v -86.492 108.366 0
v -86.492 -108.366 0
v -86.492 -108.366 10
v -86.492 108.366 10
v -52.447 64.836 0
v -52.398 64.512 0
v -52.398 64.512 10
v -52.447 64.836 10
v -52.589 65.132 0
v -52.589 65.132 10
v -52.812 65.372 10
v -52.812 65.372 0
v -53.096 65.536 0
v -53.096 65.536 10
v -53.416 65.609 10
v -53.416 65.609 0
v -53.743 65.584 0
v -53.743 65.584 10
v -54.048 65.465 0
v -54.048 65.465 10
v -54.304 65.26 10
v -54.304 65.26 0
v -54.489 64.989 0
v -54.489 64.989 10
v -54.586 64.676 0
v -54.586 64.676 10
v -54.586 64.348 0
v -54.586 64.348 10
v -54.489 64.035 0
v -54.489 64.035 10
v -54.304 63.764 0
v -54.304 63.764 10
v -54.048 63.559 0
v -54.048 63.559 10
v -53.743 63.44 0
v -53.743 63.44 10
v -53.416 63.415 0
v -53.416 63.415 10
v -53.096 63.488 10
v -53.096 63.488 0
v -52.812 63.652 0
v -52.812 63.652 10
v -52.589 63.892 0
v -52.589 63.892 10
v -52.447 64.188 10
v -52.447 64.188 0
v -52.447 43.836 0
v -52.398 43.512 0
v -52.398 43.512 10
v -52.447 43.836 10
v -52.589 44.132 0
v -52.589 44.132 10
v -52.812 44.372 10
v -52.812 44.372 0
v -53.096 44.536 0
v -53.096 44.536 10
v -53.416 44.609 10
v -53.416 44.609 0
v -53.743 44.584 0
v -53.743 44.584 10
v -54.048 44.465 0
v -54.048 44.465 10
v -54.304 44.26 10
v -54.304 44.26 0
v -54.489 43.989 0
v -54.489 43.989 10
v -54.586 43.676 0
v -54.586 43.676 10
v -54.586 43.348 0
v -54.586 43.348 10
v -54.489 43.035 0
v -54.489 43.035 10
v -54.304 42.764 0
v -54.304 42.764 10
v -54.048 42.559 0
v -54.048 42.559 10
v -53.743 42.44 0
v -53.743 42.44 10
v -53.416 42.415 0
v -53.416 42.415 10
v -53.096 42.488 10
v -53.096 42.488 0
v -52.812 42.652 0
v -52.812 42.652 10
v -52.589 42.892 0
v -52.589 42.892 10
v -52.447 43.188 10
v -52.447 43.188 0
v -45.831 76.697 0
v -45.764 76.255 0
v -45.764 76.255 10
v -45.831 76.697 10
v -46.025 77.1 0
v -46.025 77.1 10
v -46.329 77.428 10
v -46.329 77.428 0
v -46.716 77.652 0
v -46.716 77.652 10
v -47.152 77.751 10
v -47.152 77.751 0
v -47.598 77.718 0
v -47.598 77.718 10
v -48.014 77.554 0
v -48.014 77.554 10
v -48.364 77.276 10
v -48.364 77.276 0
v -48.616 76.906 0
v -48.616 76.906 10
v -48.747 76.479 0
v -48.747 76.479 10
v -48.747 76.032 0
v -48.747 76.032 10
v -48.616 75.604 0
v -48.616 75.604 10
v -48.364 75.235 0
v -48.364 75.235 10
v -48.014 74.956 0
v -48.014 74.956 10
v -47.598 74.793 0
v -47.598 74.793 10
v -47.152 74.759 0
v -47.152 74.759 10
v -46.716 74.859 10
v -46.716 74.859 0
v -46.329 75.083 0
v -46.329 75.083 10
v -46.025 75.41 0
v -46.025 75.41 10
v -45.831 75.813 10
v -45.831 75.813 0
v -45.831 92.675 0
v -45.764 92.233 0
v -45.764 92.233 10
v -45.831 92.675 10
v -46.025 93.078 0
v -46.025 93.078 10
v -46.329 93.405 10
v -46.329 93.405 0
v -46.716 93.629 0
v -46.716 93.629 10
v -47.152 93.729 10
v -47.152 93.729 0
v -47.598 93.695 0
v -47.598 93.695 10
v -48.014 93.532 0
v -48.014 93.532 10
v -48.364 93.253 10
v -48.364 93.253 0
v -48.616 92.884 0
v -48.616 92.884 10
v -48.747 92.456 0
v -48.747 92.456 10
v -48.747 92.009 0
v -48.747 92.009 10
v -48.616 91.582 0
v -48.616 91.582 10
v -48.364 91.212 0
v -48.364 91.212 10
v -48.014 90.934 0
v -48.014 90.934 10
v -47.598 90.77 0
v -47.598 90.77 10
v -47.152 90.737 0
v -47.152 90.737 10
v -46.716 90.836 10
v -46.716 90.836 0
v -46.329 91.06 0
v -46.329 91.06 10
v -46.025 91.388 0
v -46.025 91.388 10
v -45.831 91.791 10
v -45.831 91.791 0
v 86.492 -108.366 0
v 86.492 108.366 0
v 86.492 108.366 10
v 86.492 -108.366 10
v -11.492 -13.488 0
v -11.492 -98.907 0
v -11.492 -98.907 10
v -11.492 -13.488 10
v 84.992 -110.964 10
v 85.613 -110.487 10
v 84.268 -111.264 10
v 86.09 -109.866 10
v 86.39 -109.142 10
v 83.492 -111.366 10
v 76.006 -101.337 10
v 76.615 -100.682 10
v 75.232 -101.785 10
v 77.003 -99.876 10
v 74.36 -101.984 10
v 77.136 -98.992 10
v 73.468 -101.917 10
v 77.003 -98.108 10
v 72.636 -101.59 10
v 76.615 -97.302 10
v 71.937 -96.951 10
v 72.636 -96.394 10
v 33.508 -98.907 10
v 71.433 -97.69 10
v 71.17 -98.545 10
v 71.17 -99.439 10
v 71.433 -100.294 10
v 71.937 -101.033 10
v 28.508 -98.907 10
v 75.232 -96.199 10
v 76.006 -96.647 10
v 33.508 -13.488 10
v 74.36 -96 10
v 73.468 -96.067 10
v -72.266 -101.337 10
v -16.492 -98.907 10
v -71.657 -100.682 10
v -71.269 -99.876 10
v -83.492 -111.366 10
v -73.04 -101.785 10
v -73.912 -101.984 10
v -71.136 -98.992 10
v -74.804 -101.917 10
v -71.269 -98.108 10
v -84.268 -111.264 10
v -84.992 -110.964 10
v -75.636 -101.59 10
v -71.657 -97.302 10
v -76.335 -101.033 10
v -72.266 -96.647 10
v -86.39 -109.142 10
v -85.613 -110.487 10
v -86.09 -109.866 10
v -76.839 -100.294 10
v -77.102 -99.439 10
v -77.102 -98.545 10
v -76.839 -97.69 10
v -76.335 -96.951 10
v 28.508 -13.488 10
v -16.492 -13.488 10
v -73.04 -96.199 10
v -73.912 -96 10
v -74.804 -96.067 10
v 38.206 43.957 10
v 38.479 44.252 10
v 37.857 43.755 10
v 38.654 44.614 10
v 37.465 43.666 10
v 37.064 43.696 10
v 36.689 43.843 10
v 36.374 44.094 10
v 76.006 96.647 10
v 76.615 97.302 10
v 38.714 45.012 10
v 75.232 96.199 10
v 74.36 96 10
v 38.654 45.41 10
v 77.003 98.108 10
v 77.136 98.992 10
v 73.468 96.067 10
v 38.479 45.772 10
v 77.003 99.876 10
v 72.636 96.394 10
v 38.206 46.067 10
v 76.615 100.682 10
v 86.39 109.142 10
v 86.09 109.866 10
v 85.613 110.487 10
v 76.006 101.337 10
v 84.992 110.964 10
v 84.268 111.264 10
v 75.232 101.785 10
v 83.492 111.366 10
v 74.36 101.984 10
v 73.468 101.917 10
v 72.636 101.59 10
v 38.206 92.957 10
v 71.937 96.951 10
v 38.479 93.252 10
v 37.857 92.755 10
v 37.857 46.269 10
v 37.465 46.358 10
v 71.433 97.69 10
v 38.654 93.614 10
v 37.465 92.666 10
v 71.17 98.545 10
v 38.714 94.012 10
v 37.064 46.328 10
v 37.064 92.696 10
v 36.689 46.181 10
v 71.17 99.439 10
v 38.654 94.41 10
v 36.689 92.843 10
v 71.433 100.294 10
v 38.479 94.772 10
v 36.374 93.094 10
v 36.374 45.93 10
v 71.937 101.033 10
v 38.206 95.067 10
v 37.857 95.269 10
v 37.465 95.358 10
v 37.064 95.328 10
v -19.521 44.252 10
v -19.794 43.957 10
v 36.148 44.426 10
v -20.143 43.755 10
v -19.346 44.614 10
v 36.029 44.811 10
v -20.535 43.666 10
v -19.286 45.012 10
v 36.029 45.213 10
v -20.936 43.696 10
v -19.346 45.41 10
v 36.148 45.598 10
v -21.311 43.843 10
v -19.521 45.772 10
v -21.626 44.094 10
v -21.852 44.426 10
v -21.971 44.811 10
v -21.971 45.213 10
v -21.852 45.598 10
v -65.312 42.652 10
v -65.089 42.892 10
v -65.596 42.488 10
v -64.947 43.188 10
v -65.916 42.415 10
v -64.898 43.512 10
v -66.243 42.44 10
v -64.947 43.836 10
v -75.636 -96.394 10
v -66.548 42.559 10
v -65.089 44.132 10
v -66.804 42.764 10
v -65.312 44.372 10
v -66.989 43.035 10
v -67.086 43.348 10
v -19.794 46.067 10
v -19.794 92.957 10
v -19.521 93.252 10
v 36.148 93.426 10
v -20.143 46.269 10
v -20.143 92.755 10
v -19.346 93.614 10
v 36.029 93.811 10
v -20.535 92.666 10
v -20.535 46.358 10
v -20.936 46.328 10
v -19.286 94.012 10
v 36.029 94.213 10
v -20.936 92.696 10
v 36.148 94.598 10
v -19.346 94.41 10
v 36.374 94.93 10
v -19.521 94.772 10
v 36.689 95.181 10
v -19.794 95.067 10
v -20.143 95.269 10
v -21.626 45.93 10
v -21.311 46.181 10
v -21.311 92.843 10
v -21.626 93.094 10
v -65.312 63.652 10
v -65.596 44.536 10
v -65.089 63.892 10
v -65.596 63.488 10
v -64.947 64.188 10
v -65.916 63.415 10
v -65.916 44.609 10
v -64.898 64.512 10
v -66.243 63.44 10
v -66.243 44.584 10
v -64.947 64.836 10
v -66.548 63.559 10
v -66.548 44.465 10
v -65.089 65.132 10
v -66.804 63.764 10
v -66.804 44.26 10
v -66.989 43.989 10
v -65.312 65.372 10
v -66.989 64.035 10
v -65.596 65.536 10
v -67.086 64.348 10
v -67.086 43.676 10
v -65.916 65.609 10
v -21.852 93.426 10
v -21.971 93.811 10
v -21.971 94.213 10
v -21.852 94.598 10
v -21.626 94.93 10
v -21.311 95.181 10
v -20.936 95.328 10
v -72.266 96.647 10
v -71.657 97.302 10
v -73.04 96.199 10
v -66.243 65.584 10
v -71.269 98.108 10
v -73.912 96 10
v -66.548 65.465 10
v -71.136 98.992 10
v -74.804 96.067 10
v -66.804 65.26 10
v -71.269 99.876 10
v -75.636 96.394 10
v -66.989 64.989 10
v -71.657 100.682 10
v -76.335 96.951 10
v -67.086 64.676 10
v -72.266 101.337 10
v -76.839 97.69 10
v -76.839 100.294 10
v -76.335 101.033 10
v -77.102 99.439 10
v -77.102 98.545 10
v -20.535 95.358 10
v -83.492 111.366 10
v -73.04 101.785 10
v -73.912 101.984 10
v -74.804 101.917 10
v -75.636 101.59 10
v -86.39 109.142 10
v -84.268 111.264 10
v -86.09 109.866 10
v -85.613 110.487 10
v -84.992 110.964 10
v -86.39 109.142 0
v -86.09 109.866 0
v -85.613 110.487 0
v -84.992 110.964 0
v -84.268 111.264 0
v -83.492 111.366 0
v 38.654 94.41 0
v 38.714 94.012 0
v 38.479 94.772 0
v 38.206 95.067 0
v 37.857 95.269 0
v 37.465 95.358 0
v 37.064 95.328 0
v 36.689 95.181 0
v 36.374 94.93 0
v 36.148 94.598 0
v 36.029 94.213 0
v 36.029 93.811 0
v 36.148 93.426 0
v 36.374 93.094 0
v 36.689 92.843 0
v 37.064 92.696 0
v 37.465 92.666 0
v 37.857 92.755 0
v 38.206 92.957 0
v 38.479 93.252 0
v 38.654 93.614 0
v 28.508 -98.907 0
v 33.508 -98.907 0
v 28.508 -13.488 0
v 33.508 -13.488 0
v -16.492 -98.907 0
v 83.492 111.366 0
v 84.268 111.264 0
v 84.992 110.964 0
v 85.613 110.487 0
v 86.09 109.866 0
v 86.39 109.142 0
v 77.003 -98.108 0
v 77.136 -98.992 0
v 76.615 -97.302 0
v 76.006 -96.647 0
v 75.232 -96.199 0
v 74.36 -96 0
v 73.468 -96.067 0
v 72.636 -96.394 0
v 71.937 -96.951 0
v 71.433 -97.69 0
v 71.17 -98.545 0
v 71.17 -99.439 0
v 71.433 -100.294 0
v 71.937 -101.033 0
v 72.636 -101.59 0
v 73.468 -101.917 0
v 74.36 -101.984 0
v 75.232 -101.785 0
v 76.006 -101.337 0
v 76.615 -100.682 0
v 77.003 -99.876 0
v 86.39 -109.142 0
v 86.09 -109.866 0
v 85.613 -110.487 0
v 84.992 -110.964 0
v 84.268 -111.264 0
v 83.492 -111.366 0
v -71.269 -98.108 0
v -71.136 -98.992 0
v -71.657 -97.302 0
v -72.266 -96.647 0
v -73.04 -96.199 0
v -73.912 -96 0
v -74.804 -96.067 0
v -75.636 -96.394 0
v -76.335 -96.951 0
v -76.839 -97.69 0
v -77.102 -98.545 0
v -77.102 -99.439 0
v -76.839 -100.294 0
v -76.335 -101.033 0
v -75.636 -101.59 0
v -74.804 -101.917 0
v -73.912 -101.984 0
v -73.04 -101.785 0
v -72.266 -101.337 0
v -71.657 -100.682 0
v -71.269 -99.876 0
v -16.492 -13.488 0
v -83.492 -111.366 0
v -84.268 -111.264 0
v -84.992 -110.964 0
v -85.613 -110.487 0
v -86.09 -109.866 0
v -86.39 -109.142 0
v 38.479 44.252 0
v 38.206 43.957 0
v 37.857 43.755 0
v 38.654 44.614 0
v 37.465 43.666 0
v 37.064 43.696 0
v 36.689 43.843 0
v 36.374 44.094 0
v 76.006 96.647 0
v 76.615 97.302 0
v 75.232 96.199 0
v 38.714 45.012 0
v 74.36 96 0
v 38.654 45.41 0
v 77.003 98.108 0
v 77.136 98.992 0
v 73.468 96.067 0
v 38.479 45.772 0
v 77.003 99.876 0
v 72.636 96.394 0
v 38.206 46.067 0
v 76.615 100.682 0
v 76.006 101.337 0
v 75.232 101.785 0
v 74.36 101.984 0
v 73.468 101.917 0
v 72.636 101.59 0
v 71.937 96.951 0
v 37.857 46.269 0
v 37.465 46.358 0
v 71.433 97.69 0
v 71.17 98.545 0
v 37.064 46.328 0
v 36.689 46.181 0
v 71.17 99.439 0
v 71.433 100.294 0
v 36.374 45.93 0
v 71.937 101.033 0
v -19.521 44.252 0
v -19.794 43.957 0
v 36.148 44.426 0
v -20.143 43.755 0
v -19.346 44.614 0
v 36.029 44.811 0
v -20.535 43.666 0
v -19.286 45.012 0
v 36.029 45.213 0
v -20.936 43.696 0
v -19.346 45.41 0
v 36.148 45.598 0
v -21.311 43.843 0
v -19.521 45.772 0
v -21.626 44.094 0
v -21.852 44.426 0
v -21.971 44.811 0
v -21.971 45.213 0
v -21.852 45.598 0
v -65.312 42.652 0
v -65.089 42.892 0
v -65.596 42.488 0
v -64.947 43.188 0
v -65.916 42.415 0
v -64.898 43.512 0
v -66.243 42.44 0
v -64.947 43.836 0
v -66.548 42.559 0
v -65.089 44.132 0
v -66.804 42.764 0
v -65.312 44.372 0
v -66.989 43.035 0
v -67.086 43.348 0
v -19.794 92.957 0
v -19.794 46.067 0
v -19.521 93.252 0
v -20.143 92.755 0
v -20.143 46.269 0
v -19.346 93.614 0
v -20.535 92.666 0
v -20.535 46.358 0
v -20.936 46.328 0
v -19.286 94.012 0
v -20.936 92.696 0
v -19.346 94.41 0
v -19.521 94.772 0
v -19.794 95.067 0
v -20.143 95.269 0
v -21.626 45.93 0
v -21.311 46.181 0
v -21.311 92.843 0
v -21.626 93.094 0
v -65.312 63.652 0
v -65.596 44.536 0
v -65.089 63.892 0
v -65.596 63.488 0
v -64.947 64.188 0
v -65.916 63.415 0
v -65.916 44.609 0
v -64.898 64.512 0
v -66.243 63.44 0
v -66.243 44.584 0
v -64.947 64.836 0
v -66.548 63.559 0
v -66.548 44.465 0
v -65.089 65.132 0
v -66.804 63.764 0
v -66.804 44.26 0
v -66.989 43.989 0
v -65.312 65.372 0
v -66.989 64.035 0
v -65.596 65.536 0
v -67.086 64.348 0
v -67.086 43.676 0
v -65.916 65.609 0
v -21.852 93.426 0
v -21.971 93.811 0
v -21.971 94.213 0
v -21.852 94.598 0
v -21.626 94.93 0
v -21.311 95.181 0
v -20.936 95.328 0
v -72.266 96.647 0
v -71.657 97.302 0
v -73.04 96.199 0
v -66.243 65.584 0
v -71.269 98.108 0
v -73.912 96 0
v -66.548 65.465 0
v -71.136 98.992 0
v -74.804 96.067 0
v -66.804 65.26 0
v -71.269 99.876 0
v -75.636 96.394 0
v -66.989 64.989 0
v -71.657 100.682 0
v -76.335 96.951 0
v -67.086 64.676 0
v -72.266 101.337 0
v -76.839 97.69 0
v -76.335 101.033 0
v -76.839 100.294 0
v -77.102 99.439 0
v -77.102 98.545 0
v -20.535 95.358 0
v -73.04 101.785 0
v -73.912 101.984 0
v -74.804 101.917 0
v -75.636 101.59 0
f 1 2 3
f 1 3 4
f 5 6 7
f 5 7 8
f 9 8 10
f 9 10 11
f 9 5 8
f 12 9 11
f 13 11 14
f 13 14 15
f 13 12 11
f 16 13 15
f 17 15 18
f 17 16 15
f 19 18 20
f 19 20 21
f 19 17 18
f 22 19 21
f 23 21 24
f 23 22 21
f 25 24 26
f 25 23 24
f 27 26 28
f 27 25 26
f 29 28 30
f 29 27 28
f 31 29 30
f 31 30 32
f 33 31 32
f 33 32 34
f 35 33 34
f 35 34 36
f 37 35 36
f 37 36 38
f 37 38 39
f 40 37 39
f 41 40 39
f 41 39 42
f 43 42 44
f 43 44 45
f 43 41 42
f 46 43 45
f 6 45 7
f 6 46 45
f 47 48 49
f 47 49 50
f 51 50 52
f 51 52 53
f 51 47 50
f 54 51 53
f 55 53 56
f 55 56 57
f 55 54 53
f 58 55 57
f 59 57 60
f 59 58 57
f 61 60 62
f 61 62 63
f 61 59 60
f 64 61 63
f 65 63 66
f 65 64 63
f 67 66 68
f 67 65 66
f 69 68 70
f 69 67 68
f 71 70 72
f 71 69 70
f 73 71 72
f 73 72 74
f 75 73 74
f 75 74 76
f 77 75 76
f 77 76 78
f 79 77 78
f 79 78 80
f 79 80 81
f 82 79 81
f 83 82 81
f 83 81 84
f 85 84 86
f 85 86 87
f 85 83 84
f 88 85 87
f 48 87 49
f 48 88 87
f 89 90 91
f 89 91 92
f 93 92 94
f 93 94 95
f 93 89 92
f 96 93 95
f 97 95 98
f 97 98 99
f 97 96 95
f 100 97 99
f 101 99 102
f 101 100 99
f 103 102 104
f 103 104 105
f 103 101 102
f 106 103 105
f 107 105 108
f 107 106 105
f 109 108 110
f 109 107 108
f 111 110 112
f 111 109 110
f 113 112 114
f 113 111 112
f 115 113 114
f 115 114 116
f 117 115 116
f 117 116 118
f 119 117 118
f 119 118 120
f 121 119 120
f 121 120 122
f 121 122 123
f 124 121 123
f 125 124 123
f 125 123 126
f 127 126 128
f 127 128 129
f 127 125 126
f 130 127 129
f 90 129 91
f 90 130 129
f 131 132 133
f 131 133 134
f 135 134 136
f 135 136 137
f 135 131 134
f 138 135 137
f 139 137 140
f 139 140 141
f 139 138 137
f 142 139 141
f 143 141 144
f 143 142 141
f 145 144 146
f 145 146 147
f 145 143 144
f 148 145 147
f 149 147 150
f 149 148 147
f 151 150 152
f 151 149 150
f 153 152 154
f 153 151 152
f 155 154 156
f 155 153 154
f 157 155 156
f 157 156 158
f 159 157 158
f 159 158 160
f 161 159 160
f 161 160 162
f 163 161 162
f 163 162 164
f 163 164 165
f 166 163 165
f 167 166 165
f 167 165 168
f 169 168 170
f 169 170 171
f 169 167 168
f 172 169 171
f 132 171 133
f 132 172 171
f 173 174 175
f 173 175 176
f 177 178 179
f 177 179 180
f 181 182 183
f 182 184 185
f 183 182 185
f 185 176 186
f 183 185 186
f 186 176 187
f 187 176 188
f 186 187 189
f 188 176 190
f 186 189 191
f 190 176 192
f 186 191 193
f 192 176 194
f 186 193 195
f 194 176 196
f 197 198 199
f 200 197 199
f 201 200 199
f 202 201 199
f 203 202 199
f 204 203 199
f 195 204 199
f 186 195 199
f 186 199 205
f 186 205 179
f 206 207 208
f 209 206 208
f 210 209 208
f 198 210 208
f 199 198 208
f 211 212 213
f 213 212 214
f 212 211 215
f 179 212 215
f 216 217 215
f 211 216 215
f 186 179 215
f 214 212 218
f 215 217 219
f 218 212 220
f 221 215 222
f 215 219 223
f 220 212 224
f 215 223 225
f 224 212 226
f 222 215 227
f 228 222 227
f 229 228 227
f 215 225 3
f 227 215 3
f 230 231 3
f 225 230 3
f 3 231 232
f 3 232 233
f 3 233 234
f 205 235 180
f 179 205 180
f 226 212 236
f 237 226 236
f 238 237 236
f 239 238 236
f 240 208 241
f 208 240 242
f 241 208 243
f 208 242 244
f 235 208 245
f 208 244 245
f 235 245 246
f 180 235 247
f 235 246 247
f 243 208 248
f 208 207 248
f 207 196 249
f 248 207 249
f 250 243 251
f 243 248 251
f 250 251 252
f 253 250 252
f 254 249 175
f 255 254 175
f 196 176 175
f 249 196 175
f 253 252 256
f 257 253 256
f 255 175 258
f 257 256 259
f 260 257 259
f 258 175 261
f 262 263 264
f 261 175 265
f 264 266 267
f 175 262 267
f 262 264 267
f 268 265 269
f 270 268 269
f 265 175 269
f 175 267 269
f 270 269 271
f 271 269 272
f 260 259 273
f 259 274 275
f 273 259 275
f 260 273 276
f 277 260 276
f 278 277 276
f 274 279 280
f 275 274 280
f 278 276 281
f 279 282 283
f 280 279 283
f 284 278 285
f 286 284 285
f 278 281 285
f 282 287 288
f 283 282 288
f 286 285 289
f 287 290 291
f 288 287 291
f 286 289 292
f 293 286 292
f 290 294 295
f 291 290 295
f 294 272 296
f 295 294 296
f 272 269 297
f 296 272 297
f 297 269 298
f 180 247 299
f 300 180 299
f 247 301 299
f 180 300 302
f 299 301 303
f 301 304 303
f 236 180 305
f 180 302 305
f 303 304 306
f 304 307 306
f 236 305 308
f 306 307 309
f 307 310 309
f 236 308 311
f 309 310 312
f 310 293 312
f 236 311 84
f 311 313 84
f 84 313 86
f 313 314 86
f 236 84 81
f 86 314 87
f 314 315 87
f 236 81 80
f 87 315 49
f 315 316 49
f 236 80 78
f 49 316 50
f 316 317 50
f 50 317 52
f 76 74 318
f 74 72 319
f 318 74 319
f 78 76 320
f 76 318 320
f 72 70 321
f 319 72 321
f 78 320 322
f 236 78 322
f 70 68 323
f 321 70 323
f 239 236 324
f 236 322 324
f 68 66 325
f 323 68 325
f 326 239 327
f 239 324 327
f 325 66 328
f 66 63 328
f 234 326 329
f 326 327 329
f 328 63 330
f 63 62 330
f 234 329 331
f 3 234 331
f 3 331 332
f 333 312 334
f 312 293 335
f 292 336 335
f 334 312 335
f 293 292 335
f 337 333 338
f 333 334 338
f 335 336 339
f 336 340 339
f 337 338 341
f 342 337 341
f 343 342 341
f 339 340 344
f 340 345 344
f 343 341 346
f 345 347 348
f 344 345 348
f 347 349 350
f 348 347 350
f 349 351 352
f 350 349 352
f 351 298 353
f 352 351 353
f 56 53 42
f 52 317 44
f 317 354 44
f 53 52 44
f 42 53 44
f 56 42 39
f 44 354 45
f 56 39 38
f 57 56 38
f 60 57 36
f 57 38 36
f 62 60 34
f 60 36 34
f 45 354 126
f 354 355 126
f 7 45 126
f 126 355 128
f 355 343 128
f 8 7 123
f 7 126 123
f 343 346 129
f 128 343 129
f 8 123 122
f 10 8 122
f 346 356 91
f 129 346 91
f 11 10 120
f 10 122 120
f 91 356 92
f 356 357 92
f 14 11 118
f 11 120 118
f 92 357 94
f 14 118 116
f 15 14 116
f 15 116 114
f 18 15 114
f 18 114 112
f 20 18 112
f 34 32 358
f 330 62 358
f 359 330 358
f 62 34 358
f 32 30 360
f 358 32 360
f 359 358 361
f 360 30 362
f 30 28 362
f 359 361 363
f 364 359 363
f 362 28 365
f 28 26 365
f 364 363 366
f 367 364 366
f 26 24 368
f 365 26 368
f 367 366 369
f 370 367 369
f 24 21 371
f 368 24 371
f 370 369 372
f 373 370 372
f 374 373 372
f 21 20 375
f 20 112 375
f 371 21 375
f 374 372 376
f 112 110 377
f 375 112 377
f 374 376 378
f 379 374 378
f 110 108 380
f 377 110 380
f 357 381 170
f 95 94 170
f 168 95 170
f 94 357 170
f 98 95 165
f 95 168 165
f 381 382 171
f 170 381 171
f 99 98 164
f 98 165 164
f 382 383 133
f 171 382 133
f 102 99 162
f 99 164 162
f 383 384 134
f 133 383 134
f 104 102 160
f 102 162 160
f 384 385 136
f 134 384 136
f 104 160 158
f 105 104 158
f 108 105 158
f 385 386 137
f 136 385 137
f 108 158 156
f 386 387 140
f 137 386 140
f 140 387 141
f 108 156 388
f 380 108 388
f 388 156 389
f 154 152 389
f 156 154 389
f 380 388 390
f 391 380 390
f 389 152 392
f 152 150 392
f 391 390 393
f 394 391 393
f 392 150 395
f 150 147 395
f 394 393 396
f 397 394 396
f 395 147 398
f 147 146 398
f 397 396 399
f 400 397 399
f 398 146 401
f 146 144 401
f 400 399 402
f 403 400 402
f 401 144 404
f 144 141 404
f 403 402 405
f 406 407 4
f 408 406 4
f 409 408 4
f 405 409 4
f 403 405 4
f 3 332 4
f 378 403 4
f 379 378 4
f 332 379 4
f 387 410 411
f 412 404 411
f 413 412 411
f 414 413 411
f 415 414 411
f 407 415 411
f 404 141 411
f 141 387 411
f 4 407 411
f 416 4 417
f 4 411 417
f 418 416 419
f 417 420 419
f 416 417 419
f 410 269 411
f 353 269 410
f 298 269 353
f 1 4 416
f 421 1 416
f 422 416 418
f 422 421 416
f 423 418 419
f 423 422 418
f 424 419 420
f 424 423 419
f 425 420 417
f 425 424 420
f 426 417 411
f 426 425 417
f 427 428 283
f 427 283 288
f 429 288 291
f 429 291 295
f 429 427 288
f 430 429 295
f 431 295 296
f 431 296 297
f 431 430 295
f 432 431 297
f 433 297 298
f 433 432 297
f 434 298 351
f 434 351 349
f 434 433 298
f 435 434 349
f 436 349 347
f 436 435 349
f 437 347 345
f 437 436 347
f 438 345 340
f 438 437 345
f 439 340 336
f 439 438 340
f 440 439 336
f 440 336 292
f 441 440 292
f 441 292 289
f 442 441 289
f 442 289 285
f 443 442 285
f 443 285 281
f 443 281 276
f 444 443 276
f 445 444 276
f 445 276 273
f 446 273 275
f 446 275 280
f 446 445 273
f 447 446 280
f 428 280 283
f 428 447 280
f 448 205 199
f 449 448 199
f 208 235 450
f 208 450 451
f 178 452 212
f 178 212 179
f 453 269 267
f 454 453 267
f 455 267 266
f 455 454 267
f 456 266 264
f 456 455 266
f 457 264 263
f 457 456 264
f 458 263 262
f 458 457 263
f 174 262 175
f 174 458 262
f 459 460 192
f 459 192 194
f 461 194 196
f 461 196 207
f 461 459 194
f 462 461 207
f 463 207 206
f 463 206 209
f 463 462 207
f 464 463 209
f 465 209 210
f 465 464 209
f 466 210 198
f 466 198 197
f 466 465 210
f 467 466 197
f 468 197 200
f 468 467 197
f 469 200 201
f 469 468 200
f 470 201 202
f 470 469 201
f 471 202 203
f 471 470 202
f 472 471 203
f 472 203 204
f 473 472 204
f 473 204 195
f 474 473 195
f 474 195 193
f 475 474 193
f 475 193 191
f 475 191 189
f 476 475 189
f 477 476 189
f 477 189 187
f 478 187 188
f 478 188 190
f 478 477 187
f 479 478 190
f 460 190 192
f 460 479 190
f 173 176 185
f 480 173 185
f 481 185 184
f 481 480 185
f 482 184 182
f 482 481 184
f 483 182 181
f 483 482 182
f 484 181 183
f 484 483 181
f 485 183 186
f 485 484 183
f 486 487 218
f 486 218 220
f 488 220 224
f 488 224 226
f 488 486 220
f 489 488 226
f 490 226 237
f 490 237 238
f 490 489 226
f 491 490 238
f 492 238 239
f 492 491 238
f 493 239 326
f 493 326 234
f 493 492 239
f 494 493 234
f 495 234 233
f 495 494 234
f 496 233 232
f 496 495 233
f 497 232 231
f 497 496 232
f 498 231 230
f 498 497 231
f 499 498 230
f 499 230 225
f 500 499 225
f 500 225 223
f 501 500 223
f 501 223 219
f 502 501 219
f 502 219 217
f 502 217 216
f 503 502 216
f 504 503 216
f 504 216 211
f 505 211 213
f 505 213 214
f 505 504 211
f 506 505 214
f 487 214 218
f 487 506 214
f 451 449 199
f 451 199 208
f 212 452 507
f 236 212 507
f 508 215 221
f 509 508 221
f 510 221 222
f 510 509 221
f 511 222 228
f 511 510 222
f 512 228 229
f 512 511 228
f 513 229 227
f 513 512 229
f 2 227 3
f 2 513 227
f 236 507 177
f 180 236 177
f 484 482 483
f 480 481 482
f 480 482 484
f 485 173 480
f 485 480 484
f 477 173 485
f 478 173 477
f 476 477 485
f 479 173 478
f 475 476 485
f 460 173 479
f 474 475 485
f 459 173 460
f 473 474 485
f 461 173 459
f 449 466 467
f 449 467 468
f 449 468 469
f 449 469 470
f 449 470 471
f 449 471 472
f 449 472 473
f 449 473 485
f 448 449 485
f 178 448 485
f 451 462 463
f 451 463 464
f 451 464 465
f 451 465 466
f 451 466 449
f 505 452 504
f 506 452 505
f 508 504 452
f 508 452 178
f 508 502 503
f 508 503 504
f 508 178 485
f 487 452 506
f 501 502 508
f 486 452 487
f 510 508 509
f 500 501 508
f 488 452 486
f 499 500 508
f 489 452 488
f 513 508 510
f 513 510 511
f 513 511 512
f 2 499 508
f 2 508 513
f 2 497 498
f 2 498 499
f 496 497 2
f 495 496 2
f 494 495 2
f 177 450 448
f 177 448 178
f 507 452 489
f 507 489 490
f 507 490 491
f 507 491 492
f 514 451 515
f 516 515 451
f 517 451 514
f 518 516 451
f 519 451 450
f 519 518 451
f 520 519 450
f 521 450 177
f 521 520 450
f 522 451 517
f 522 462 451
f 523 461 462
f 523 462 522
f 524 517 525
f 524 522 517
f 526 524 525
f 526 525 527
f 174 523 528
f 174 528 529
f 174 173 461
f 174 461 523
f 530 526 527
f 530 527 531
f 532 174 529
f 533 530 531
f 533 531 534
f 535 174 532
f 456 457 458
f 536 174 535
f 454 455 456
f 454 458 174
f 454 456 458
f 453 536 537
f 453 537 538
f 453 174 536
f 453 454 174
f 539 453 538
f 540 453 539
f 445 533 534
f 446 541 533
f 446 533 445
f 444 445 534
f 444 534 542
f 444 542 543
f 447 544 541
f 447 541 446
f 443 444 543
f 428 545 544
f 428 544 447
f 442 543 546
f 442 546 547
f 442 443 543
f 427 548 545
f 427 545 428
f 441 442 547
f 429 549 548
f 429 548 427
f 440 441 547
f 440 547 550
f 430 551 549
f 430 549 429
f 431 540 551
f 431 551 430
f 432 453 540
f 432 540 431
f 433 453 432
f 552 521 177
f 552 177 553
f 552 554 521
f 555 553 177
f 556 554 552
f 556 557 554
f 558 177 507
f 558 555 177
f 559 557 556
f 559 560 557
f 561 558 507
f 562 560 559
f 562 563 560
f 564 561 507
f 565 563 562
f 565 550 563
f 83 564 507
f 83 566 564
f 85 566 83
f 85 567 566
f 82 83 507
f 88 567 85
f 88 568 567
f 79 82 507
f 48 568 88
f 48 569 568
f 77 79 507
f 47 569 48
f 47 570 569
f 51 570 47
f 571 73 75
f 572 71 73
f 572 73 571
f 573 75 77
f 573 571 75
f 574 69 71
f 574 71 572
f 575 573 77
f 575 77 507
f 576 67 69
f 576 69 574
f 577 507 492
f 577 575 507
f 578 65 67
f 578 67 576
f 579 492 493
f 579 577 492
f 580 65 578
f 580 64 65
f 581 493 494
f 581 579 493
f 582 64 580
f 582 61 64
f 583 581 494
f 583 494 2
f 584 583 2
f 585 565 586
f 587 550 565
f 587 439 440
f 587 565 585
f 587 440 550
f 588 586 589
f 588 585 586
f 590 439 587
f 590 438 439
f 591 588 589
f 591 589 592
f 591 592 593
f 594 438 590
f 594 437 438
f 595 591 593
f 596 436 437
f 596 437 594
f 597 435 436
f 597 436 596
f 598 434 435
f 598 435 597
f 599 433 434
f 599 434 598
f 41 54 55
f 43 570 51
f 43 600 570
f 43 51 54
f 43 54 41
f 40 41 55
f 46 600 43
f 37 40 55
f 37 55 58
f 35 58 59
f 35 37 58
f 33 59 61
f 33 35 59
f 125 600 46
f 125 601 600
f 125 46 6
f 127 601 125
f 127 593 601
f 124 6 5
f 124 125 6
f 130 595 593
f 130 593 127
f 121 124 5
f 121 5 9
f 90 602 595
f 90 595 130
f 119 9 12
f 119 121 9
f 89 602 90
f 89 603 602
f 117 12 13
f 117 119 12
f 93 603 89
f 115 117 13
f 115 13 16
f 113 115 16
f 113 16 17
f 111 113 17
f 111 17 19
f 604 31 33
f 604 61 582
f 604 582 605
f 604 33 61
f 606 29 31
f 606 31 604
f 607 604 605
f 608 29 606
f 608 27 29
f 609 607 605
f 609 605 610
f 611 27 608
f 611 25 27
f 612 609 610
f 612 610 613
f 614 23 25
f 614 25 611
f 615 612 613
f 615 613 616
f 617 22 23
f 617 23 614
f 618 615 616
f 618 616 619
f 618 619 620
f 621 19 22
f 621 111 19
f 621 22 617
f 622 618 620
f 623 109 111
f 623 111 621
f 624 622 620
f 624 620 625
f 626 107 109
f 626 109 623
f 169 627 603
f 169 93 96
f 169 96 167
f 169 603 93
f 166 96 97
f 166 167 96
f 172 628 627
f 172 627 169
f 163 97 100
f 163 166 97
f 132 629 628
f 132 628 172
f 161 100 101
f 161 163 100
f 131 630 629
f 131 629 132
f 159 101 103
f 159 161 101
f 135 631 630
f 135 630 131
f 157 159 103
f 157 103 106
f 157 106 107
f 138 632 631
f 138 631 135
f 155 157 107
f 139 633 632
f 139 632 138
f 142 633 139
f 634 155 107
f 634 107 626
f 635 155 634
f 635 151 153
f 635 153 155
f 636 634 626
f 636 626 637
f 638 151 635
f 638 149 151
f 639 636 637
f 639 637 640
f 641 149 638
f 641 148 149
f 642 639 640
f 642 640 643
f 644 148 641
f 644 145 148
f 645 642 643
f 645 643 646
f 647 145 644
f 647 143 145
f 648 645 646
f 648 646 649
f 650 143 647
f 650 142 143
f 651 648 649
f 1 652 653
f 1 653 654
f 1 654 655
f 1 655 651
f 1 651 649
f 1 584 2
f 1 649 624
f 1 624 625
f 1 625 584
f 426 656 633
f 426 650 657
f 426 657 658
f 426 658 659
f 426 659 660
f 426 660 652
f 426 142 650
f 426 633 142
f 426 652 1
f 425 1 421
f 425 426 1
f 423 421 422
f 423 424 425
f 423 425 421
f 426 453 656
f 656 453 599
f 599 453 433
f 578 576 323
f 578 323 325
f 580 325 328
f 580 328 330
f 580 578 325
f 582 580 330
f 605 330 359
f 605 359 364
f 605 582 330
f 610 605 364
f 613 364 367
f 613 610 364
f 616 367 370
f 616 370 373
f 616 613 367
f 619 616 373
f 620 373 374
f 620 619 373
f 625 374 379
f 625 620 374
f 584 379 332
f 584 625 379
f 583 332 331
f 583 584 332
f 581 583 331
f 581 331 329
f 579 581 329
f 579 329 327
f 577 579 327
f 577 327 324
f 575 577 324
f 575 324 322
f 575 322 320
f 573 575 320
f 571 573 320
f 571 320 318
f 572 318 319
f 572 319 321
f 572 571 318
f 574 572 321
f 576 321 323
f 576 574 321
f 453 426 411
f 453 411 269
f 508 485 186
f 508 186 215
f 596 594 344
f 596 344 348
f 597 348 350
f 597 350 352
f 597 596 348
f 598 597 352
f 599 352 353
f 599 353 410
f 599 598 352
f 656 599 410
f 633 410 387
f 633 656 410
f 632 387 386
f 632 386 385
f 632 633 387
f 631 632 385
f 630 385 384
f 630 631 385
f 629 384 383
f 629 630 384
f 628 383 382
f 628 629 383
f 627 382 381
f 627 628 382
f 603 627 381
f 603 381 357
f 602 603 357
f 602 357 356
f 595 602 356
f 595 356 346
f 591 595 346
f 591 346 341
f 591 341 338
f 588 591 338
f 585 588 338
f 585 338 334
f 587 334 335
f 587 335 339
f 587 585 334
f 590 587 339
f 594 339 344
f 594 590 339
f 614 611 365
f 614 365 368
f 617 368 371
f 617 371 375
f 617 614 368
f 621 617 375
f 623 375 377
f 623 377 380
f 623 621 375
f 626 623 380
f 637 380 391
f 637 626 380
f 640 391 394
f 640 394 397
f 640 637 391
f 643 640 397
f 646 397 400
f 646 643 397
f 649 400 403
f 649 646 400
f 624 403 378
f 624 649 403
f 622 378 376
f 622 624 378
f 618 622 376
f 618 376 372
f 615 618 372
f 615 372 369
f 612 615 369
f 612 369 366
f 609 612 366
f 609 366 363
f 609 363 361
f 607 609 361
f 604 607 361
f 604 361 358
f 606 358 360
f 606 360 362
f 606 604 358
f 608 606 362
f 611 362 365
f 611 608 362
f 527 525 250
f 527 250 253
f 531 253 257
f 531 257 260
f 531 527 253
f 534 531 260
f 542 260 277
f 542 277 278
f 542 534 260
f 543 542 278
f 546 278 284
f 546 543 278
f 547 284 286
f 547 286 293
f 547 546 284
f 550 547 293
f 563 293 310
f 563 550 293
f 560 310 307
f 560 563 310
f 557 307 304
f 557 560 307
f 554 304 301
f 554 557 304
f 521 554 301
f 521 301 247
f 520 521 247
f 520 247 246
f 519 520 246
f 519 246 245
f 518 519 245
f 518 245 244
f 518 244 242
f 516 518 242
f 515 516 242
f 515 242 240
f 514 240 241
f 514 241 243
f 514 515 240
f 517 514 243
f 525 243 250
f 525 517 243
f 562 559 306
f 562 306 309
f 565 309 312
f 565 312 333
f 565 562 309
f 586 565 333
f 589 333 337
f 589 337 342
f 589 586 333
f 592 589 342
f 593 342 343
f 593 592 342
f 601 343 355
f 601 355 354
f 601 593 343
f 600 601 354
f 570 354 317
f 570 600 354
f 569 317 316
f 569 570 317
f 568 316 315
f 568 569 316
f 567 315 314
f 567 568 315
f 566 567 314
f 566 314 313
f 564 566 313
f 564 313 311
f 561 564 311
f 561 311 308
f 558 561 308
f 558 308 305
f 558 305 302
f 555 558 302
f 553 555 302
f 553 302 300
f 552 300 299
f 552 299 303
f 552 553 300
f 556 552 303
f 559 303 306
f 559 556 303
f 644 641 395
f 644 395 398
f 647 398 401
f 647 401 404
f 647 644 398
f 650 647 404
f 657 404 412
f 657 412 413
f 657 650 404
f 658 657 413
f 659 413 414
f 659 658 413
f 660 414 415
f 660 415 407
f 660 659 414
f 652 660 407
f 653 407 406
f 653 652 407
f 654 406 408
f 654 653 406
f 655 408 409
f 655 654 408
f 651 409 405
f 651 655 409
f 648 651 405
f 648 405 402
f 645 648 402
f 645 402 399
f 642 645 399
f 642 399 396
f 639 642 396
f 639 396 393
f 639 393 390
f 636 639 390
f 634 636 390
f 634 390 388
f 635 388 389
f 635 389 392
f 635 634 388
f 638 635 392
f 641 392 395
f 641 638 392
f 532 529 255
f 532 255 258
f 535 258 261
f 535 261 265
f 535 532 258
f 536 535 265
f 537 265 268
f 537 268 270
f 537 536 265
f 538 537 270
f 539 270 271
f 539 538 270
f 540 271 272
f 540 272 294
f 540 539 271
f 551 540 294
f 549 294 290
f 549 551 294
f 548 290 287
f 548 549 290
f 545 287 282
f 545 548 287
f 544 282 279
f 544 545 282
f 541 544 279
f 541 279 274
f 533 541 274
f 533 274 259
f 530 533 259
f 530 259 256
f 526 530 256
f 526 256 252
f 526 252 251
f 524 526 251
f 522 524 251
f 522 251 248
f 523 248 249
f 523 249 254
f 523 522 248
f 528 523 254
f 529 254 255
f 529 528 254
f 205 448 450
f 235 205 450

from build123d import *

# Parameters (mm, degrees)
CROQUIS1_R              = 3
CROQUIS1_W              = 5
CROQUIS1_H              = 85.41873638
CROQUIS1_W_2            = 23.862
CROQUIS1_H_2            = 25
CROQUIS1_W_3            = 15
CROQUIS1_H_3            = 20
CROQUIS1_R_2            = 1.5
CROQUIS1_R_3            = 1.1
CROQUIS1_R_4            = 1.35
SALIENTE_EXTRUIR1_DEPTH = 10


with BuildPart() as part:
    # Croquis1 → Saliente-Extruir1 (new body)
    with BuildSketch(Plane.XY):
        with BuildLine():
            ThreePointArc((83.492, 111.366), (85.613320344, 110.487320344), (86.492, 108.366))
            Line((86.492, 108.366), (86.492, -108.366))
            ThreePointArc((86.492, -108.366), (85.613320344, -110.487320344), (83.492, -111.366))
            Line((83.492, -111.366), (-83.492, -111.366))
            ThreePointArc((-83.492, -111.366), (-85.613320344, -110.487320344), (-86.492, -108.366))
            Line((-86.492, -108.366), (-86.492, 108.366))
            ThreePointArc((-86.492, 108.366), (-85.613320344, 110.487320344), (-83.492, 111.366))
            Line((-83.492, 111.366), (83.492, 111.366))
        make_face()
        with Locations((74.136, 98.992)):
            Circle(CROQUIS1_R, mode=Mode.SUBTRACT)
        with Locations((-74.136, 98.992)):
            Circle(CROQUIS1_R, mode=Mode.SUBTRACT)
        with Locations((74.136, -98.992)):
            Circle(CROQUIS1_R, mode=Mode.SUBTRACT)
        with Locations((-74.136, -98.992)):
            Circle(CROQUIS1_R, mode=Mode.SUBTRACT)
        with BuildLine():
            ThreePointArc((55.881809493, 42.260900296), (58.356683228, 43.286026562), (59.381809493, 45.760900296))
            Line((59.381809493, 45.760900296), (59.381809493, 94.012))
            ThreePointArc((59.381809493, 94.012), (58.356683228, 96.486873734), (55.881809493, 97.512))
            Line((55.881809493, 97.512), (-22.118190507, 97.512))
            ThreePointArc((-22.118190507, 97.512), (-24.593064241, 96.486873734), (-25.618190507, 94.012))
            Line((-25.618190507, 94.012), (-25.618190507, 45.760900296))
            ThreePointArc((-25.618190507, 45.760900296), (-24.593064241, 43.286026562), (-22.118190507, 42.260900296))
            Line((-22.118190507, 42.260900296), (55.881809493, 42.260900296))
        make_face(mode=Mode.SUBTRACT)
        with Locations((31.008, -56.19736819)):
            Rectangle(CROQUIS1_W, CROQUIS1_H, mode=Mode.SUBTRACT)
        with Locations((-13.992, -56.19736819)):
            Rectangle(CROQUIS1_W, CROQUIS1_H, mode=Mode.SUBTRACT)
        with Locations((-56.067, 54.012)):
            Rectangle(CROQUIS1_W_2, CROQUIS1_H_2, mode=Mode.SUBTRACT)
        with Locations((-52.84846771, 84.244)):
            Rectangle(CROQUIS1_W_3, CROQUIS1_H_3, mode=Mode.SUBTRACT)
        with Locations((-52.84846771, 84.244)):
            Rectangle(CROQUIS1_W_3, CROQUIS1_H_3)
        with Locations((-47.26410382, 92.23269661)):
            Circle(CROQUIS1_R_2, mode=Mode.SUBTRACT)
        with Locations((-47.26410382, 76.25530339)):
            Circle(CROQUIS1_R_2, mode=Mode.SUBTRACT)
        with Locations((-56.067, 54.012)):
            Rectangle(CROQUIS1_W_2, CROQUIS1_H_2)
        with Locations((-53.498, 64.512)):
            Circle(CROQUIS1_R_3, mode=Mode.SUBTRACT)
        with Locations((-53.498, 43.512)):
            Circle(CROQUIS1_R_3, mode=Mode.SUBTRACT)
        with Locations((-65.998, 43.512)):
            Circle(CROQUIS1_R_3, mode=Mode.SUBTRACT)
        with Locations((-65.998, 64.512)):
            Circle(CROQUIS1_R_3, mode=Mode.SUBTRACT)
        with BuildLine():
            Line((-22.118190507, 42.260900296), (55.881809493, 42.260900296))
            ThreePointArc((55.881809493, 42.260900296), (58.356683228, 43.286026562), (59.381809493, 45.760900296))
            Line((59.381809493, 45.760900296), (59.381809493, 94.012))
            ThreePointArc((59.381809493, 94.012), (58.356683228, 96.486873734), (55.881809493, 97.512))
            Line((55.881809493, 97.512), (-22.118190507, 97.512))
            ThreePointArc((-22.118190507, 97.512), (-24.593064241, 96.486873734), (-25.618190507, 94.012))
            Line((-25.618190507, 94.012), (-25.618190507, 45.760900296))
            ThreePointArc((-25.618190507, 45.760900296), (-24.593064241, 43.286026562), (-22.118190507, 42.260900296))
        make_face()
        with Locations((-20.636, 94.012)):
            Circle(CROQUIS1_R_4, mode=Mode.SUBTRACT)
        with Locations((37.364, 94.012)):
            Circle(CROQUIS1_R_4, mode=Mode.SUBTRACT)
        with Locations((37.364, 45.012)):
            Circle(CROQUIS1_R_4, mode=Mode.SUBTRACT)
        with Locations((-20.636, 45.012)):
            Circle(CROQUIS1_R_4, mode=Mode.SUBTRACT)
    extrude(amount=SALIENTE_EXTRUIR1_DEPTH)


solid = part.part
